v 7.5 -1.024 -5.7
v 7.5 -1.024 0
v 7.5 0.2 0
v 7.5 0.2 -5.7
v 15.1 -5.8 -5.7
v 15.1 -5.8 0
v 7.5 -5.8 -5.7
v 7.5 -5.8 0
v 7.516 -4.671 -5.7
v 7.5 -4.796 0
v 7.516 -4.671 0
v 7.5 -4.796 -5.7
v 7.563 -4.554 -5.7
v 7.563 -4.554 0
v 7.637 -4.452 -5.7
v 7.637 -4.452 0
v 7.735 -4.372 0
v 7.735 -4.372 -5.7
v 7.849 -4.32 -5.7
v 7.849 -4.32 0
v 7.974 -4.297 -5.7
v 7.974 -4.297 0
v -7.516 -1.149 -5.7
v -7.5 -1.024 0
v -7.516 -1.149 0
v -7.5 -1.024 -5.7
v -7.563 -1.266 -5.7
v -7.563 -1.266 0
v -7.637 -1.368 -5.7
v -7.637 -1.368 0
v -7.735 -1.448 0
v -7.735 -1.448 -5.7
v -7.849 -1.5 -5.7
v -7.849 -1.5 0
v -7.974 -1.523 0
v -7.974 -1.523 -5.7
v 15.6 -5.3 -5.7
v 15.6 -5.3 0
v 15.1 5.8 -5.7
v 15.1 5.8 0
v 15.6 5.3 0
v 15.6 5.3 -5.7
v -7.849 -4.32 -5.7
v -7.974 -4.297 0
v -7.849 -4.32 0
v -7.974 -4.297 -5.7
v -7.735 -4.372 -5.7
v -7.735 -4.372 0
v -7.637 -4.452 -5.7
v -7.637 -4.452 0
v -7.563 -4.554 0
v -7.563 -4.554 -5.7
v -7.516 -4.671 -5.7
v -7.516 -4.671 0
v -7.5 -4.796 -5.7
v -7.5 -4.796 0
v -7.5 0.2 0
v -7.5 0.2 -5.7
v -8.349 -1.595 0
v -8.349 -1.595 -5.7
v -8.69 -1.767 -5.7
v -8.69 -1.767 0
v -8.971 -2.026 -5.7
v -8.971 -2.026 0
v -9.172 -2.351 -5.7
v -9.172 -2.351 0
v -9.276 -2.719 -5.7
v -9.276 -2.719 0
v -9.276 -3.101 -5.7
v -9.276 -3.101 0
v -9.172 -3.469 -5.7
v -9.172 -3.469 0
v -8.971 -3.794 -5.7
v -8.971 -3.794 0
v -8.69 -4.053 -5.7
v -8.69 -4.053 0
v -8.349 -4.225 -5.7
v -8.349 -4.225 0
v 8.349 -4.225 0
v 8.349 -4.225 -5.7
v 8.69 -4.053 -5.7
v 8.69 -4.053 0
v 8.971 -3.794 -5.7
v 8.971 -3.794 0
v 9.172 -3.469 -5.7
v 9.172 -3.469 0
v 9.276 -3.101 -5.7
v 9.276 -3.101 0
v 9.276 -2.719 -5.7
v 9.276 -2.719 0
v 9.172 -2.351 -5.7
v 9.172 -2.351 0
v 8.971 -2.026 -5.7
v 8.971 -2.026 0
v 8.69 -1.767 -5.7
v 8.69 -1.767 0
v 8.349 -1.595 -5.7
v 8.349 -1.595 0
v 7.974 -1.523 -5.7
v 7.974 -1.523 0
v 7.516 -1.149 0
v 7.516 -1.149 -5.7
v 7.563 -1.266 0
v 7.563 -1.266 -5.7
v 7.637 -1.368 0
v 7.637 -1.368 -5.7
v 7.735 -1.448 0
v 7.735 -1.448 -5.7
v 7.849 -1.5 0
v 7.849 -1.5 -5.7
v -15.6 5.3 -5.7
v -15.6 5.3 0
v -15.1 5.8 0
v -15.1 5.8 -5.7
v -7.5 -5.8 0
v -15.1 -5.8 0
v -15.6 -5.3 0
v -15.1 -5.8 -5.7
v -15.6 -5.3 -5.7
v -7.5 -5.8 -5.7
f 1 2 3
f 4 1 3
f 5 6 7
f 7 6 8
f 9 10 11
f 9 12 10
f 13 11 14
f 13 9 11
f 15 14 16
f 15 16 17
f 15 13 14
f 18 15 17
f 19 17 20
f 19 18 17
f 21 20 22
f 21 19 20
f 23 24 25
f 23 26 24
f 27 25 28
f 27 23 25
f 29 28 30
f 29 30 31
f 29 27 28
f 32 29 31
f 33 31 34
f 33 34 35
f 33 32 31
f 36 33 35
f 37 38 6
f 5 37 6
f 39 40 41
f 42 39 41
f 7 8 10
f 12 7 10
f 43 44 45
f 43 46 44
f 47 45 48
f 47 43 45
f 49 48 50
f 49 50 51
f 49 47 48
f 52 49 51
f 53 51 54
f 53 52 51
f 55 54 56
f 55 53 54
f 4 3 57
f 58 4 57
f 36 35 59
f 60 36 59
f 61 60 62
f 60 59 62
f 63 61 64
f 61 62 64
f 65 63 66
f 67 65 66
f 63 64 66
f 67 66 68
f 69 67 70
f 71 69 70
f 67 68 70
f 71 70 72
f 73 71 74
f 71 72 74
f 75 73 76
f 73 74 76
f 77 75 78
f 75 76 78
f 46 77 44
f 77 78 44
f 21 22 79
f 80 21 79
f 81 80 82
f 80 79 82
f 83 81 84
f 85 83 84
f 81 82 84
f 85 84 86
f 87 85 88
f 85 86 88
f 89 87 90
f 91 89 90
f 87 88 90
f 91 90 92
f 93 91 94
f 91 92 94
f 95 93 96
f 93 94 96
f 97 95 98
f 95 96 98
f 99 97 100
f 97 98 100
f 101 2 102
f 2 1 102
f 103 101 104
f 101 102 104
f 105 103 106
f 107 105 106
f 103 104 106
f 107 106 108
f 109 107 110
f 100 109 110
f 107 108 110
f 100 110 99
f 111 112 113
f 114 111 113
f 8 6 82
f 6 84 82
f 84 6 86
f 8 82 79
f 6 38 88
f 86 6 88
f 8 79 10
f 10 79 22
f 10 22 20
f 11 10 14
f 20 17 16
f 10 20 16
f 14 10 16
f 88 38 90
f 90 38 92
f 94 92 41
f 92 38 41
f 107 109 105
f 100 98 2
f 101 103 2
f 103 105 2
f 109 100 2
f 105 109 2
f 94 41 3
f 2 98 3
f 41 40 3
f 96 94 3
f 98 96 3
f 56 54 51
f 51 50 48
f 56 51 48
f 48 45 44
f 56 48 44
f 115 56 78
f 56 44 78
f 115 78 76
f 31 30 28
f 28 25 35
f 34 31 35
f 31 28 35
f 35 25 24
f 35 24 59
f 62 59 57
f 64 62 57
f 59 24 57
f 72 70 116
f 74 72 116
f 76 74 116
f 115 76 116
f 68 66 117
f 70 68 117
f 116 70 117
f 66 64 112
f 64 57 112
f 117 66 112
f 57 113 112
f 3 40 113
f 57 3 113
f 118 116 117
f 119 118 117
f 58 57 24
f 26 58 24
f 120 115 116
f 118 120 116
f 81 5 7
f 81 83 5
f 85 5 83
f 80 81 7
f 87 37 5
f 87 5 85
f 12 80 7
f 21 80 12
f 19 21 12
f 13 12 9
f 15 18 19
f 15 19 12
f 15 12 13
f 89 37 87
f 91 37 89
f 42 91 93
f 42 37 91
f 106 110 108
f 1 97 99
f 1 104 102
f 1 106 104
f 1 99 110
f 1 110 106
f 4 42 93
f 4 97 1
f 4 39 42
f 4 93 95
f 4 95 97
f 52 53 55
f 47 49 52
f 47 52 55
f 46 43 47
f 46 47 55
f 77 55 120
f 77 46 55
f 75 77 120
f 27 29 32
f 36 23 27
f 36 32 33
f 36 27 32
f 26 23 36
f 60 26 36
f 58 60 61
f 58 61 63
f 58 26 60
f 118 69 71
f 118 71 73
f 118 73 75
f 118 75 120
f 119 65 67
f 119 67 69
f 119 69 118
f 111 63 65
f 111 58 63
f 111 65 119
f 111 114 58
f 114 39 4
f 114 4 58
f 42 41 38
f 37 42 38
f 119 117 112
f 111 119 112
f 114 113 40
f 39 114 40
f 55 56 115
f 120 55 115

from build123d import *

# Parameters (mm, degrees)
BOSS_EXTRUDE1_DEPTH = 5.7
FILLET1_R           = 0.5


with BuildPart() as part:
    # Sketch1 → Boss-Extrude1 (new body)
    with BuildSketch(Plane.XY):
        with BuildLine():
            Line((7.5, -1.579841739), (7.5, 0.2))
            Line((7.5, 0.2), (-7.5, 0.2))
            Line((-7.5, 0.2), (-7.5, -1.579841739))
            ThreePointArc((-7.5, -1.579841739), (-9.289, -2.91), (-7.5, -4.240158261))
            Line((-7.5, -4.240158261), (-7.5, -5.8))
            Line((-7.5, -5.8), (-15.1, -5.8))
            Line((-15.1, -5.8), (-15.6, -5.3))
            Line((-15.6, -5.3), (-15.6, 5.3))
            Line((-15.6, 5.3), (-15.1, 5.8))
            Line((-15.1, 5.8), (15.1, 5.8))
            Line((15.1, 5.8), (15.6, 5.3))
            Line((15.6, 5.3), (15.6, -5.3))
            Line((15.6, -5.3), (15.1, -5.8))
            Line((15.1, -5.8), (7.5, -5.8))
            Line((7.5, -5.8), (7.5, -4.240158261))
            ThreePointArc((7.5, -4.240158261), (9.289, -2.91), (7.5, -1.579841739))
        make_face()
    extrude(amount=-BOSS_EXTRUDE1_DEPTH)

    # Fillet1
    fillet1_edges = [part.edges().sort_by_distance(p)[0] for p in [
        (-7.5, -1.579841739, -2.85),
        (-7.5, -4.240158261, -2.85),
        (7.5, -4.240158261, -2.85),
        (7.5, -1.579841739, -2.85),
    ]]
    fillet(fillet1_edges, radius=FILLET1_R)


solid = part.part
